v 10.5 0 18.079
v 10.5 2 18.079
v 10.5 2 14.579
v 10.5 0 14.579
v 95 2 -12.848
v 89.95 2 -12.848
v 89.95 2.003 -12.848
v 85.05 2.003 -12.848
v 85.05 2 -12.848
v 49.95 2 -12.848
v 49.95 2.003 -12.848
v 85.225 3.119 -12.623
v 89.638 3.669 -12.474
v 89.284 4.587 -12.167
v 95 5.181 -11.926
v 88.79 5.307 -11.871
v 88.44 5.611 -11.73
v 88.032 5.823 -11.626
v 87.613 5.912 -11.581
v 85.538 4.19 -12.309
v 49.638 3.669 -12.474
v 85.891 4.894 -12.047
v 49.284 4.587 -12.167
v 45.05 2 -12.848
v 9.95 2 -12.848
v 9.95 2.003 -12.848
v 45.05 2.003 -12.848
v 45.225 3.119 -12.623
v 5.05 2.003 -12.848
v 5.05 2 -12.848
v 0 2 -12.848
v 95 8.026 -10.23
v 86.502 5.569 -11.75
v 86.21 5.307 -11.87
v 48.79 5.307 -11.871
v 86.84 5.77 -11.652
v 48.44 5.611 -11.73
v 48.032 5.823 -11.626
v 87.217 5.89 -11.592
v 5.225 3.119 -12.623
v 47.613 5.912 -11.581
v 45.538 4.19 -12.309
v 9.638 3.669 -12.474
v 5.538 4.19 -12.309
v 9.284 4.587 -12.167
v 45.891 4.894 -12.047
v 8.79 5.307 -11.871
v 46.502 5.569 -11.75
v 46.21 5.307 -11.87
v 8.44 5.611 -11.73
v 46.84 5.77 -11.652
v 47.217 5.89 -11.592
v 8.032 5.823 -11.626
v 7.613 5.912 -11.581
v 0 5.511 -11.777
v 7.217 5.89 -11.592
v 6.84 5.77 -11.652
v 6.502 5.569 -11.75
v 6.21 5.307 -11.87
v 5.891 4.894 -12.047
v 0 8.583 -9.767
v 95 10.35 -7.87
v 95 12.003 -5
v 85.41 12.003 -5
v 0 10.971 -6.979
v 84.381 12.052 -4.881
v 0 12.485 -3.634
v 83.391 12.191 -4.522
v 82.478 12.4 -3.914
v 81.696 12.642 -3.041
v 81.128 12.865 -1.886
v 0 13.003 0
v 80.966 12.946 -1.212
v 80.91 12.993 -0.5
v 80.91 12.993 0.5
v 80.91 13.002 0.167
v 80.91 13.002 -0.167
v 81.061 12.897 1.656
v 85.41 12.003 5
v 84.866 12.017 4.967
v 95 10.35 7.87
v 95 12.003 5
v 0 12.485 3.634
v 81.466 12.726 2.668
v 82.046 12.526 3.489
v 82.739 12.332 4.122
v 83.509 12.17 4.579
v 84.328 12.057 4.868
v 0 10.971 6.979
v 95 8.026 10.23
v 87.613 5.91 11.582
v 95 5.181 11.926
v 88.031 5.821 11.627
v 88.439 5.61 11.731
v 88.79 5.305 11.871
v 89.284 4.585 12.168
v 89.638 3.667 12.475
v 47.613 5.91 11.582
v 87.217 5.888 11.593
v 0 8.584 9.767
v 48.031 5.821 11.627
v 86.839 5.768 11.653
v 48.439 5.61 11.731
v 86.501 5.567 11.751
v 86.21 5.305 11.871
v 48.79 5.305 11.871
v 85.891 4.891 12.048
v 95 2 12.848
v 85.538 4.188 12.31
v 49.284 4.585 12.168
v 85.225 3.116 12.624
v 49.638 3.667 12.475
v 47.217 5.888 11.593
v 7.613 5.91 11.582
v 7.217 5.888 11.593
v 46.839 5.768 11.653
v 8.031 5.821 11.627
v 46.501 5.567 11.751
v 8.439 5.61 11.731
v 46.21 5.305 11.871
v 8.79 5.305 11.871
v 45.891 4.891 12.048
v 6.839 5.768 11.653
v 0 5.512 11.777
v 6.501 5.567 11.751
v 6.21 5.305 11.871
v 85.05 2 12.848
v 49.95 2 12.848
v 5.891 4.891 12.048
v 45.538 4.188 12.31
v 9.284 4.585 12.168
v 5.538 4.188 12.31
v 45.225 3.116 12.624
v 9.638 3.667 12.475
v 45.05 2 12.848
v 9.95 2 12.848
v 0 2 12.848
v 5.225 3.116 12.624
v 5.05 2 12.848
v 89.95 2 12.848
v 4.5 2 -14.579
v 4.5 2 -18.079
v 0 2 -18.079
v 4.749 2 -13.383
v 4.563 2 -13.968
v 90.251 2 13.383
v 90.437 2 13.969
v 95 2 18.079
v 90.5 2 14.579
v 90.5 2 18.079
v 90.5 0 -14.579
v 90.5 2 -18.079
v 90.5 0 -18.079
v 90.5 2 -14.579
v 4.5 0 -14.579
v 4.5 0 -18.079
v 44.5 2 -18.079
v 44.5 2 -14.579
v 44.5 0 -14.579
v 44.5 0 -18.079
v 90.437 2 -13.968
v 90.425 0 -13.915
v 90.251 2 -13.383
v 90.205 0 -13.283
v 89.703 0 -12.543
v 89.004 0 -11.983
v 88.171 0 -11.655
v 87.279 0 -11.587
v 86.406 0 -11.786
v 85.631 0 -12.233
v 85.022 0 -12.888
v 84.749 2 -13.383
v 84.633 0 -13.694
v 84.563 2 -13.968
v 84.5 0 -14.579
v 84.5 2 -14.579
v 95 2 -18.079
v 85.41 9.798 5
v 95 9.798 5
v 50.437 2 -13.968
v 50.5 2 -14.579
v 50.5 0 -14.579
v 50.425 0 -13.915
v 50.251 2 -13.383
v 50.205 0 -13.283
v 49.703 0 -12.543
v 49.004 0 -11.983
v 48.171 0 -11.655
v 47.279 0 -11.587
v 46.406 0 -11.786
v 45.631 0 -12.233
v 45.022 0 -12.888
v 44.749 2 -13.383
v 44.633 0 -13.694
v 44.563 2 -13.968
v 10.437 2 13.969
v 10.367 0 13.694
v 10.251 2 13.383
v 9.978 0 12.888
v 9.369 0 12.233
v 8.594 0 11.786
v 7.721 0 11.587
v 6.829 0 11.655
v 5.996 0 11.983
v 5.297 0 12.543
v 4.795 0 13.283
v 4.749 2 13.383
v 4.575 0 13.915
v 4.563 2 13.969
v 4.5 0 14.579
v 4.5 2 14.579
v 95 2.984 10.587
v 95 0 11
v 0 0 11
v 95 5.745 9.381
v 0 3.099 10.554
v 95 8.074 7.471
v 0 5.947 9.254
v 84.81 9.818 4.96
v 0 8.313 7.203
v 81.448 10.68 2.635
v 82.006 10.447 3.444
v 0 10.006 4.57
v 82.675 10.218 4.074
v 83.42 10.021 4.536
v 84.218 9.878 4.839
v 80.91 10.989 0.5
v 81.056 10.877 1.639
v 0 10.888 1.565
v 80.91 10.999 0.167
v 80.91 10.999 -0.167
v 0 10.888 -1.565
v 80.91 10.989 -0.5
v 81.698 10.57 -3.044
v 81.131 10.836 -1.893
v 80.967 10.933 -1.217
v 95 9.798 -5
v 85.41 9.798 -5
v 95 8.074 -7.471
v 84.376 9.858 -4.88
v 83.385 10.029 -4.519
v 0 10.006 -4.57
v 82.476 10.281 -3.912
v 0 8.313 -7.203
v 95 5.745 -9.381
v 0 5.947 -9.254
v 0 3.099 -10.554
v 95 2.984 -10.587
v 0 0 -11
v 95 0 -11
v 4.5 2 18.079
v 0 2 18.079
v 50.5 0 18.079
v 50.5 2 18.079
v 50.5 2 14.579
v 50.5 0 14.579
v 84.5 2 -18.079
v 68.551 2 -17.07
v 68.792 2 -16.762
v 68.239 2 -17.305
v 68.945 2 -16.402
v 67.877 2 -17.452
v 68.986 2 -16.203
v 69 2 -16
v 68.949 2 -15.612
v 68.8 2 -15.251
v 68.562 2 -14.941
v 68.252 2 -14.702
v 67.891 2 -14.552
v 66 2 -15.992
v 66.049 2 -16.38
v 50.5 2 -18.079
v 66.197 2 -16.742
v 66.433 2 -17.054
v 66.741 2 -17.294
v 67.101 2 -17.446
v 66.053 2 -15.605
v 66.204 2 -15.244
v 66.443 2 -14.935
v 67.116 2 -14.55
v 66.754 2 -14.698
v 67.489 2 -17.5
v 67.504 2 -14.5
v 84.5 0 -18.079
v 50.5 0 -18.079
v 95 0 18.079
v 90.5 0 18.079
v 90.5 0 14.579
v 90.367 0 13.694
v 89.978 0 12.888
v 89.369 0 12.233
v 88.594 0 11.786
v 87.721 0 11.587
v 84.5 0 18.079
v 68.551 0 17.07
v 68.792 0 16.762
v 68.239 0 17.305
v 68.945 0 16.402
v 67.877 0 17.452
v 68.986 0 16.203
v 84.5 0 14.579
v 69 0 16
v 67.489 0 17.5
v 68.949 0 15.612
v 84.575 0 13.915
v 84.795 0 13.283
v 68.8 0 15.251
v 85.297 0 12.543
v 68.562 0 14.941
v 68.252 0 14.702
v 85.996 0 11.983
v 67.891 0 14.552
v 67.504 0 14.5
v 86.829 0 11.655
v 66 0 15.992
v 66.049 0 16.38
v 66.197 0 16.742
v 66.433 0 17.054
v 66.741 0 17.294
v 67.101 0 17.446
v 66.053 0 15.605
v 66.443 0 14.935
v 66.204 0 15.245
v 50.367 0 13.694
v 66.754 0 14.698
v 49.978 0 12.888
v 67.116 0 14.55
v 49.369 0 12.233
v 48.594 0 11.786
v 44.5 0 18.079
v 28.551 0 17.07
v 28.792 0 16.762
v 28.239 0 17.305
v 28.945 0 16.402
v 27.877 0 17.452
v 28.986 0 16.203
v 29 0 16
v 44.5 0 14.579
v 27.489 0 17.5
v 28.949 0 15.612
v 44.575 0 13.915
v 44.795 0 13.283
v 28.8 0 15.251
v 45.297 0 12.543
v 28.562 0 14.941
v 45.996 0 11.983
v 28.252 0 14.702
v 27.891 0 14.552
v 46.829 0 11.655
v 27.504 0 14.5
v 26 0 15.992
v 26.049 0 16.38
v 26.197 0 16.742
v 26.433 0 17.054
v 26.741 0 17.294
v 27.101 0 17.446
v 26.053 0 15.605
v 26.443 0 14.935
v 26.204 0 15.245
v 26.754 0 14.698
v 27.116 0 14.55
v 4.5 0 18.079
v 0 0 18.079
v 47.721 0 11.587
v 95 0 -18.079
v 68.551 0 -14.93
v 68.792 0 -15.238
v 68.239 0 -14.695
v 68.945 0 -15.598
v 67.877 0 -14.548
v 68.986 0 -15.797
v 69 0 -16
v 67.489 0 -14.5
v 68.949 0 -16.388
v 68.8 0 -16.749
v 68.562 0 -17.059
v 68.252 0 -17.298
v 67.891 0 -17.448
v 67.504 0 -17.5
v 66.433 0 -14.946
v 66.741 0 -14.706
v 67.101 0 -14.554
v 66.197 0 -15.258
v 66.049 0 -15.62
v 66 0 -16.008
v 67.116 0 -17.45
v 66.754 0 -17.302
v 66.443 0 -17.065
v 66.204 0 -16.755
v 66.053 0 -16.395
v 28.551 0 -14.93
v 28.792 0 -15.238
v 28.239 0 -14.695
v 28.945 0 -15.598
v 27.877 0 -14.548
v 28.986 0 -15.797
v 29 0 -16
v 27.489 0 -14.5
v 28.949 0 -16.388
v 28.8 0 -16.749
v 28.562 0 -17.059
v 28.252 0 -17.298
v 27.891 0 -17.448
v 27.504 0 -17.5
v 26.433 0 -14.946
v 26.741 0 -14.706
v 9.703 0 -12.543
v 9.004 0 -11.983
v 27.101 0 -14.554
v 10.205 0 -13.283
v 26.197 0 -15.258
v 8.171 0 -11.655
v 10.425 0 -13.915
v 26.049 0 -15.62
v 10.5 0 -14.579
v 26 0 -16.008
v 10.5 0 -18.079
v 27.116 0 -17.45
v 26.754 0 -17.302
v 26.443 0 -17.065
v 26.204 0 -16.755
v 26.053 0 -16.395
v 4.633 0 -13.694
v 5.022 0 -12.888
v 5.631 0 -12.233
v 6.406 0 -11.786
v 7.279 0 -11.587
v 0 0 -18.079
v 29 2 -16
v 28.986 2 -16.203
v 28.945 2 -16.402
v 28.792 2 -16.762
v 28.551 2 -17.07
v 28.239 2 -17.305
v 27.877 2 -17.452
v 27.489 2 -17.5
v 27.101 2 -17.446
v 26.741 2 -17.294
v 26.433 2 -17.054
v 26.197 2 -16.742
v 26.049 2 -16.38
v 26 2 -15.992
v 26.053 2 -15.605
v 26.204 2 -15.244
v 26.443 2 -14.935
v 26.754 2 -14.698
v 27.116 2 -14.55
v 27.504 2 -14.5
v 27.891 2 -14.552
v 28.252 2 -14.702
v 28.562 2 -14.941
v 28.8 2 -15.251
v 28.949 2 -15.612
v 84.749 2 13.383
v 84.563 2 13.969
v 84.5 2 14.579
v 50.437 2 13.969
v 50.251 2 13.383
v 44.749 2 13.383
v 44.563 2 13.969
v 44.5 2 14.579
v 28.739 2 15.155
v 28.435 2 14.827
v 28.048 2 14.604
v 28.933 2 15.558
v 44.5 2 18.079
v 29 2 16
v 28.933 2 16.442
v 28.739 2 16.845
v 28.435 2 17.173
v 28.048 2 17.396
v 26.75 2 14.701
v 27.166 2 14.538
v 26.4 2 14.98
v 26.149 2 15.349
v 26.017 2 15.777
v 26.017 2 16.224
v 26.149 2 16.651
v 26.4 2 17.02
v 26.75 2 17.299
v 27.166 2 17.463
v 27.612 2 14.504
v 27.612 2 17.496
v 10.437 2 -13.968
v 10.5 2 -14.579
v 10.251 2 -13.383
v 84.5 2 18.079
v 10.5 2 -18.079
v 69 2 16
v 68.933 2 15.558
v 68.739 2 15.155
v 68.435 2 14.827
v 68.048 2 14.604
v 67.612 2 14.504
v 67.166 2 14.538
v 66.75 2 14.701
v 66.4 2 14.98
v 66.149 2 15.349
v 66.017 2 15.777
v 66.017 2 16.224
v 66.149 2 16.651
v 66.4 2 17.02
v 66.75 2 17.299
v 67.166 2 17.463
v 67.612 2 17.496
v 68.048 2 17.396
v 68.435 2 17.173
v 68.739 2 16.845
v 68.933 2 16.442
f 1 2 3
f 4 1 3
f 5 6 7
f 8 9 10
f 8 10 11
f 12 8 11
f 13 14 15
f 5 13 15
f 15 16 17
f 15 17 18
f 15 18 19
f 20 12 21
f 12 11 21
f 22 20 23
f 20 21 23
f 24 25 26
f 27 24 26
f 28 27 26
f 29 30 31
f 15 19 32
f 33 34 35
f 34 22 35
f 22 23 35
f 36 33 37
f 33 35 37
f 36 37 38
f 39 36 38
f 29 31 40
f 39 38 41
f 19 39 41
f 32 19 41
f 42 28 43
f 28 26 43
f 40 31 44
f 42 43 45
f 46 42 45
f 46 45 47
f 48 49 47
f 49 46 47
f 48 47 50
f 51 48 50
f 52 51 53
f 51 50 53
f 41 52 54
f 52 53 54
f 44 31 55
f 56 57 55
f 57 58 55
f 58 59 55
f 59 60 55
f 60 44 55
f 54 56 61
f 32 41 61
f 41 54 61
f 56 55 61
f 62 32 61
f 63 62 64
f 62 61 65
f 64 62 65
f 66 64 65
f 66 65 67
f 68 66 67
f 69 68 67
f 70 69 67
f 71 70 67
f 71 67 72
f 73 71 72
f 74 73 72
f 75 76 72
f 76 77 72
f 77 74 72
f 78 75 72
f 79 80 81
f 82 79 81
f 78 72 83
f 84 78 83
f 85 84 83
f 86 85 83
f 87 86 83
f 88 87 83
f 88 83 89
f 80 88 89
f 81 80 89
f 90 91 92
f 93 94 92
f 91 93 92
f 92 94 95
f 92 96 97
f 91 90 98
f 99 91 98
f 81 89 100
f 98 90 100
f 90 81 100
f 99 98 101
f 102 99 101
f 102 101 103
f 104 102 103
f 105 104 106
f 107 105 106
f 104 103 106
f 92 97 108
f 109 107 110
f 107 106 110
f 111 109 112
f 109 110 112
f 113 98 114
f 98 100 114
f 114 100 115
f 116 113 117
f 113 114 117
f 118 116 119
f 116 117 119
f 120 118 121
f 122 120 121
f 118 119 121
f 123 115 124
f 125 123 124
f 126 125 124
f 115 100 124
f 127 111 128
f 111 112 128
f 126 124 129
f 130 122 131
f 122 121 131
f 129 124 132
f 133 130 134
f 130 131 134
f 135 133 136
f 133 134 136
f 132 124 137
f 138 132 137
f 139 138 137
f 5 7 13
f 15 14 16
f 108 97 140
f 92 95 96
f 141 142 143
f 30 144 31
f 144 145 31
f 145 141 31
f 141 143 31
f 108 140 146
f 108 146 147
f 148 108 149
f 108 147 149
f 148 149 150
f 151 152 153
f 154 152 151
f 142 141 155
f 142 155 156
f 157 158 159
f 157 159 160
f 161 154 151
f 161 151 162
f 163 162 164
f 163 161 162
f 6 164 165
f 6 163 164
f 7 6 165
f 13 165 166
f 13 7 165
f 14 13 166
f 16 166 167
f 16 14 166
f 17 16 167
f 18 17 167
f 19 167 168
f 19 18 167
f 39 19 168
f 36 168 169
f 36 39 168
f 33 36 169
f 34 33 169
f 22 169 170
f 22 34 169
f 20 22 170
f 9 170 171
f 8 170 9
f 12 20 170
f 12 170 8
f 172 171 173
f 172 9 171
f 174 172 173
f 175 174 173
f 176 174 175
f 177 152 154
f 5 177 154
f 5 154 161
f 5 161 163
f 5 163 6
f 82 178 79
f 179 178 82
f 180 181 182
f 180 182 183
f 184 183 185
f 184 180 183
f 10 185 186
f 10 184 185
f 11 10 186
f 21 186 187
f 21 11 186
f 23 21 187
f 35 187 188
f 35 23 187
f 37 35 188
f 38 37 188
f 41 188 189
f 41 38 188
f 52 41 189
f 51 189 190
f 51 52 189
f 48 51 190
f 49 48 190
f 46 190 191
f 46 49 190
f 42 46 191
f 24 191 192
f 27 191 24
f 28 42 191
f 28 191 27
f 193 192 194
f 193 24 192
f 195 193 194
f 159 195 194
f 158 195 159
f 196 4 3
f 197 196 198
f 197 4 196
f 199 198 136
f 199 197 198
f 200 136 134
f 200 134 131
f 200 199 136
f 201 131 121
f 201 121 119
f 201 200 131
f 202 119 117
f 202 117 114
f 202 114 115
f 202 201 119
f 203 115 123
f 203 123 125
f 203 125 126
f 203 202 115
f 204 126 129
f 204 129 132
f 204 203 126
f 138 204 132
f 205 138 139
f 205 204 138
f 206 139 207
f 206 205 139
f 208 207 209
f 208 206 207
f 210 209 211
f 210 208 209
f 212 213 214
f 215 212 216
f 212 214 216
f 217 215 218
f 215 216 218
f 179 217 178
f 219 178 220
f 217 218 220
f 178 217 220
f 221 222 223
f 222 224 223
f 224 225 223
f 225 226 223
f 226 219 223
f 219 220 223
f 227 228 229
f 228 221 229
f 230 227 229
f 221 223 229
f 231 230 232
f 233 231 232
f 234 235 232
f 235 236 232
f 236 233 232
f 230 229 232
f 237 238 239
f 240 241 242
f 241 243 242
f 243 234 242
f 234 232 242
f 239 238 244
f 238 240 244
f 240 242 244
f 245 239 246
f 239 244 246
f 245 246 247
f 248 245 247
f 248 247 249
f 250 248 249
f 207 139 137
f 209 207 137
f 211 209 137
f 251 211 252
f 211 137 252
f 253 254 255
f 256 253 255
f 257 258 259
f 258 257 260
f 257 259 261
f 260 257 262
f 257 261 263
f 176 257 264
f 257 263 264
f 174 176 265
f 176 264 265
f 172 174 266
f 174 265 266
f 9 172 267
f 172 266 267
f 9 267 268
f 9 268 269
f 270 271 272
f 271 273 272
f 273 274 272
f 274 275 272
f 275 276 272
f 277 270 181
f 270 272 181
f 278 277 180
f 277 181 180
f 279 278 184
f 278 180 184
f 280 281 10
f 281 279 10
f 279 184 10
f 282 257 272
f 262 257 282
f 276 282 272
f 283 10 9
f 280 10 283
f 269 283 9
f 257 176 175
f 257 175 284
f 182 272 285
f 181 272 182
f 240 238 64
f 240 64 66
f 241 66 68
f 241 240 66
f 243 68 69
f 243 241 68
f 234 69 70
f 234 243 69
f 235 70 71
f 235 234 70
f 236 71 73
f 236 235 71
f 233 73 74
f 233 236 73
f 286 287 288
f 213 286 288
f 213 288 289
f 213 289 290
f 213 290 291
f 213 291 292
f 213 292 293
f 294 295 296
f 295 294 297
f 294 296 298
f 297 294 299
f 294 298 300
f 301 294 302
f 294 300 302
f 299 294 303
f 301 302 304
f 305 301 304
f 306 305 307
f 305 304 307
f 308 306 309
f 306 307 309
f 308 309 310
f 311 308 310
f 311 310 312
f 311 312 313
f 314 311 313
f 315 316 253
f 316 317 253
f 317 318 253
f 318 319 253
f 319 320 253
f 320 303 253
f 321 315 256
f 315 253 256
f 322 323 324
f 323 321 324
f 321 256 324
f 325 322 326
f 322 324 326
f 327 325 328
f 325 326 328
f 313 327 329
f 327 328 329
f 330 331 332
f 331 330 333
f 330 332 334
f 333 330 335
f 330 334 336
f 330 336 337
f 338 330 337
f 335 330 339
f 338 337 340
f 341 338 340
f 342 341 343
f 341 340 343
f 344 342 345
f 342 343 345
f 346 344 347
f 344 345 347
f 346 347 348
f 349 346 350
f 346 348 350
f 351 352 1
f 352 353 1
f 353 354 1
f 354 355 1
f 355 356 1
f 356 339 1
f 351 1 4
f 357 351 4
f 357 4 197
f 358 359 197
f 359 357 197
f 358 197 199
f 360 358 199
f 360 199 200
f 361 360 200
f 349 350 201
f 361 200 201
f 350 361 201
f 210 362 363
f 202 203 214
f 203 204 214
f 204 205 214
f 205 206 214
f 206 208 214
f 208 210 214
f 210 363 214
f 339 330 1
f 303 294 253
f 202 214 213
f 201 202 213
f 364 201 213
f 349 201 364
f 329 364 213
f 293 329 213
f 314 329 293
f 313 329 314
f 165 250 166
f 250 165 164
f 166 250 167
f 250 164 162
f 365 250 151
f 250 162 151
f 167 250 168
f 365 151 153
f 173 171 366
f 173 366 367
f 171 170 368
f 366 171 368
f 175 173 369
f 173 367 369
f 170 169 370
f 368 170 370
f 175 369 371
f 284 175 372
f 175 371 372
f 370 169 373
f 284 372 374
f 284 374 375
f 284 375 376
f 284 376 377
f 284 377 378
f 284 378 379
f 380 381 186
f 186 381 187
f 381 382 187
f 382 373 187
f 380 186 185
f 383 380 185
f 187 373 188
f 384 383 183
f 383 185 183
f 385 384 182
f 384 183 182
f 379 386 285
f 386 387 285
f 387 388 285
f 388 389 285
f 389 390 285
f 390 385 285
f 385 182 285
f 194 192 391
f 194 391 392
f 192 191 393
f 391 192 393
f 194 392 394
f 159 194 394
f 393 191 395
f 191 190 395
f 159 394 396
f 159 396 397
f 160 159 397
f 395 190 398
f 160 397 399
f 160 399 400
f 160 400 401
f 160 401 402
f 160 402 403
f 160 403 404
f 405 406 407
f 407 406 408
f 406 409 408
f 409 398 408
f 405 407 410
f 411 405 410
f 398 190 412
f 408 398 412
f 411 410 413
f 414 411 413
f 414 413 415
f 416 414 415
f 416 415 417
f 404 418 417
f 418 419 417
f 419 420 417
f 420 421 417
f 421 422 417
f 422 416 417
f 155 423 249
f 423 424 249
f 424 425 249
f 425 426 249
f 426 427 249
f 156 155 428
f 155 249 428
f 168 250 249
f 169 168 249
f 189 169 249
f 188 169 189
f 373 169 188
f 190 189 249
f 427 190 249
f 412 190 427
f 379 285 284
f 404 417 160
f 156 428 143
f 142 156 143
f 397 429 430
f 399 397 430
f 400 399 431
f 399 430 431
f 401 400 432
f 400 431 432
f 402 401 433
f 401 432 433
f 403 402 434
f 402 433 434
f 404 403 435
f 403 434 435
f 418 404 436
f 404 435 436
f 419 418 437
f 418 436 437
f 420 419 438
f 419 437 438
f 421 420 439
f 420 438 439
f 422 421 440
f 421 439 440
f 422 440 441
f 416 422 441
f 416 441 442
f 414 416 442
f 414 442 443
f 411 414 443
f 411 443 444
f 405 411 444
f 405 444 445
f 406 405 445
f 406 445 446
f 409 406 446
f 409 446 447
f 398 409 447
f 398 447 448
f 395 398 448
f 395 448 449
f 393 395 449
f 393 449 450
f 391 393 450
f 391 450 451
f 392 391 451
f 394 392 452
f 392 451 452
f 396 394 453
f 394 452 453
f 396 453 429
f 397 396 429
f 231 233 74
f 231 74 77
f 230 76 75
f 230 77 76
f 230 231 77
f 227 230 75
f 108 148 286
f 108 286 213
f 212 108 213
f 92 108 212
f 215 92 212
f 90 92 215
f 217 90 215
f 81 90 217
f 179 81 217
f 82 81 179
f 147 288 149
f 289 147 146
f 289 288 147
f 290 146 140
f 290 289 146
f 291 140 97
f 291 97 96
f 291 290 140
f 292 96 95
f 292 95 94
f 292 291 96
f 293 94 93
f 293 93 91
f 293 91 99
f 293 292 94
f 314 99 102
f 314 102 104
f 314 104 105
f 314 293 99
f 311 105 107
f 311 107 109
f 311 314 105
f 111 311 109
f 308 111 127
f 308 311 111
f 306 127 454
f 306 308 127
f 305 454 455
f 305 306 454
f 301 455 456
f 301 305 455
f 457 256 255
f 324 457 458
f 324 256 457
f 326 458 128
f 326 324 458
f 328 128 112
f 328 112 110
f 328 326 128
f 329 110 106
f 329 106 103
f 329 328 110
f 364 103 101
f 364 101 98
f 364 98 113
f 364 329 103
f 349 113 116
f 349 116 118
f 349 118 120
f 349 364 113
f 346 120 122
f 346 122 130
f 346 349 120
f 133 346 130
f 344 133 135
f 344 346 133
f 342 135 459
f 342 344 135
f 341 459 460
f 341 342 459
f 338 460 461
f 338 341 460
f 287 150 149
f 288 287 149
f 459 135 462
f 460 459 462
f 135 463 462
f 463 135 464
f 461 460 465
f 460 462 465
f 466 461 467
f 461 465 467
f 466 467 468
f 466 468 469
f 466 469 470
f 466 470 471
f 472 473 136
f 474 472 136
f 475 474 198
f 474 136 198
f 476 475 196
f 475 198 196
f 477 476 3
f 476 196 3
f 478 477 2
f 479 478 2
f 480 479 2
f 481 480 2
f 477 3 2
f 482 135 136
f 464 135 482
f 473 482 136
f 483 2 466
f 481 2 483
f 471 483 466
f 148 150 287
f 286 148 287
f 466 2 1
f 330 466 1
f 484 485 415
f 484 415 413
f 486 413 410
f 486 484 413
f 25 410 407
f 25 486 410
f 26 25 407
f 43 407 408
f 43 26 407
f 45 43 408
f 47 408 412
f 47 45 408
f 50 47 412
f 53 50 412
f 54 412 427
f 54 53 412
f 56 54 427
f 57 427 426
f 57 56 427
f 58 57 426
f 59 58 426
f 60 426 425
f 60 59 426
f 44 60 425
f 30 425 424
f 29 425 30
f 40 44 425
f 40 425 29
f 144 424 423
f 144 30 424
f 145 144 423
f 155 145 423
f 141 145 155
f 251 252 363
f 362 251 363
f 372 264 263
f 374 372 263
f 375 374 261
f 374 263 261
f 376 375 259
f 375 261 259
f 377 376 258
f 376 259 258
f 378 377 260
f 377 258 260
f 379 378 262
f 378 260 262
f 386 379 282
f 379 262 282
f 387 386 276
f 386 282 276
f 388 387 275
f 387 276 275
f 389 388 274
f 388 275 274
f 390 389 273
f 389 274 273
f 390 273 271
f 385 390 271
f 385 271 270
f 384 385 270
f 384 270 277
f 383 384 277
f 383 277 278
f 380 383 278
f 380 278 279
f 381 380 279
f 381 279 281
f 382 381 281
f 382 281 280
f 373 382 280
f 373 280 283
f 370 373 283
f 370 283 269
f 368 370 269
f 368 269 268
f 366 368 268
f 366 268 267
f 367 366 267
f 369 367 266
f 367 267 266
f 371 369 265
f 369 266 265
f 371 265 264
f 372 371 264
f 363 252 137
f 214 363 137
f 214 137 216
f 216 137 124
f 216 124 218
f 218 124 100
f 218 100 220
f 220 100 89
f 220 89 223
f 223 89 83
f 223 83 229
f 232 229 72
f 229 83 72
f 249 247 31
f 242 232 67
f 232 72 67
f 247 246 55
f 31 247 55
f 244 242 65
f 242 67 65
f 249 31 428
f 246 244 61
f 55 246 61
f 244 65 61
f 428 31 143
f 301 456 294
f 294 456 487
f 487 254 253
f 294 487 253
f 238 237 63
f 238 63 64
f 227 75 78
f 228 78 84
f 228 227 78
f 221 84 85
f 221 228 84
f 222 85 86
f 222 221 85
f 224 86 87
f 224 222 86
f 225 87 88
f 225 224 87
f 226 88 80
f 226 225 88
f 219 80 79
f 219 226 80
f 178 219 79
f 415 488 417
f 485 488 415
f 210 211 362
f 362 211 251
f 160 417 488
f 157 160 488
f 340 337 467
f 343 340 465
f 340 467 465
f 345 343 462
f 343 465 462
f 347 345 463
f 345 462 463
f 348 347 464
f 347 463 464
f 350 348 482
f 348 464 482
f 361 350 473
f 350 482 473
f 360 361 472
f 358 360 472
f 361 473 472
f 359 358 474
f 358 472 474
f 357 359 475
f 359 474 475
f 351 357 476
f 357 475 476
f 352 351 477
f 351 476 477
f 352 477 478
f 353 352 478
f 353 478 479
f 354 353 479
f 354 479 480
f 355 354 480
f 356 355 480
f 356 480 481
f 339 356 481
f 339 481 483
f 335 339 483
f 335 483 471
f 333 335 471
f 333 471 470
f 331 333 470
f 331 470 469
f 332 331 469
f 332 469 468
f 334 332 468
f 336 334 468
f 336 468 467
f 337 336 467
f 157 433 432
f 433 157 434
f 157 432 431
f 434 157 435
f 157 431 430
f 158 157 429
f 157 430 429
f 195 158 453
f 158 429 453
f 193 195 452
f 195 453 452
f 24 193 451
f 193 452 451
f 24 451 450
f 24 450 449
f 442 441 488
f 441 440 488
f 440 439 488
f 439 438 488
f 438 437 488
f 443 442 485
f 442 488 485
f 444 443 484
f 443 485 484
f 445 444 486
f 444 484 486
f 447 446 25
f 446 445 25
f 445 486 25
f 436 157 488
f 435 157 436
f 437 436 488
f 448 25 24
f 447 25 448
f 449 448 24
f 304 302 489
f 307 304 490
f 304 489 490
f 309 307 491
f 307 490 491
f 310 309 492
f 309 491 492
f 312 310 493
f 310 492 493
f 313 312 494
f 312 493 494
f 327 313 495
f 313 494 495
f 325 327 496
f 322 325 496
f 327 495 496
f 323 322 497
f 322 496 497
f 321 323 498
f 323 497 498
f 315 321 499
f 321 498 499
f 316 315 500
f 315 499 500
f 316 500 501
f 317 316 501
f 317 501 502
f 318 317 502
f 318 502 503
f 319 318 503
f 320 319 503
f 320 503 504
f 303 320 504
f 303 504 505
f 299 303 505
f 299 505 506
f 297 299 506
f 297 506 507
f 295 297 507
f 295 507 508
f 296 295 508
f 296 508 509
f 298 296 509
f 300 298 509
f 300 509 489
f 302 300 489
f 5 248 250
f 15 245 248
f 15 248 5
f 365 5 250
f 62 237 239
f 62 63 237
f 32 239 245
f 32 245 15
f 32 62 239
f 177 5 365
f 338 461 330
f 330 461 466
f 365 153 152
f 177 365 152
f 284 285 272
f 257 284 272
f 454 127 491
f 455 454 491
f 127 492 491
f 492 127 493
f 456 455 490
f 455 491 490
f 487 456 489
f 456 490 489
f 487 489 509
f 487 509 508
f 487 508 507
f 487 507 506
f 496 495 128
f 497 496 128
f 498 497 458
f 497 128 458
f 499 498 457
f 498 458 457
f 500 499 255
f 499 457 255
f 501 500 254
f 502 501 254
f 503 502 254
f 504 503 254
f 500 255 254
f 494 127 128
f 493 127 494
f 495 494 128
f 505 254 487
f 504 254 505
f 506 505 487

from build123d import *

# Parameters (mm, degrees)
EXTRUDE_1_DEPTH          = 95
SKETCH_2_R               = 1.5
CUT_EXTRUDE_1_DEPTH      = 12.002837415
CUT_EXTRUDE_1_DEPTH_BACK = 3.00301723
CUT_EXTRUDE_2_DEPTH      = 14.002837554


with BuildPart() as part:
    # Эскиз1 → Бобышка-Вытянуть1 (new body)
    with BuildSketch(Plane(origin=(0, 0, 0), x_dir=(0, 0, -1), z_dir=(1, 0, 0))):
        with BuildLine():
            Line((11, 0), (18.079487192, 0))
            Line((18.079487192, 0), (18.079487192, 2))
            Line((18.079487192, 2), (12.848104212, 2))
            ThreePointArc((12.848104212, 2), (0.000220895, 13.002837452), (-12.848036252, 2.000436531))
            Line((-12.848036252, 2.000436531), (-18.079487192, 2))
            Line((-18.079487192, 2), (-18.079487192, 0))
            Line((-18.079487192, 0), (-11, 0))
            ThreePointArc((-11, 0), (0, 11), (11, 0))
        make_face()
    extrude(amount=EXTRUDE_1_DEPTH)

    # Эскиз2 → Вырез-Вытянуть1 (cut, two sides)
    with BuildSketch(Plane(origin=(0, 2.001508604, 0.000167013), x_dir=(1, 0, 0), z_dir=(0, 0.999999997, 8.3444e-05))) as cut_extrude_1_sk:
        with Locations((27.5, -16)):
            Circle(SKETCH_2_R)
        with Locations((67.5, -16)):
            Circle(SKETCH_2_R)
        with Locations((67.5, 16)):
            Circle(SKETCH_2_R)
        with Locations((27.5, 16)):
            Circle(SKETCH_2_R)
        with BuildLine():
            Line((4.5, -14.579320241), (4.5, -18.29882224))
            Line((4.5, -18.29882224), (10.5, -18.29882224))
            Line((10.5, -18.29882224), (10.5, -14.579320241))
            ThreePointArc((10.5, -14.579320241), (7.5, -11.579320241), (4.5, -14.579320241))
        make_face()
        with BuildLine():
            Line((50.5, -18.29882224), (50.5, -14.579320241))
            ThreePointArc((50.5, -14.579320241), (47.5, -11.579320241), (44.5, -14.579320241))
            Line((44.5, -14.579320241), (44.5, -18.29882224))
            Line((44.5, -18.29882224), (50.5, -18.29882224))
        make_face()
        with BuildLine():
            Line((90.5, -18.29882224), (90.5, -14.579320241))
            ThreePointArc((90.5, -14.579320241), (87.5, -11.579320241), (84.5, -14.579320241))
            Line((84.5, -14.579320241), (84.5, -18.29882224))
            Line((84.5, -18.29882224), (90.5, -18.29882224))
        make_face()
        with BuildLine():
            Line((84.5, 18.29882224), (90.5, 18.29882224))
            Line((90.5, 18.29882224), (90.5, 14.579320241))
            ThreePointArc((90.5, 14.579320241), (87.5, 11.579320241), (84.5, 14.579320241))
            Line((84.5, 14.579320241), (84.5, 18.29882224))
        make_face()
        with BuildLine():
            Line((44.5, 18.29882224), (50.5, 18.29882224))
            Line((50.5, 18.29882224), (50.5, 14.579320241))
            ThreePointArc((50.5, 14.579320241), (47.5, 11.579320241), (44.5, 14.579320241))
            Line((44.5, 14.579320241), (44.5, 18.29882224))
        make_face()
        with BuildLine():
            Line((4.5, 18.29882224), (10.5, 18.29882224))
            Line((10.5, 18.29882224), (10.5, 14.579320241))
            ThreePointArc((10.5, 14.579320241), (7.5, 11.579320241), (4.5, 14.579320241))
            Line((4.5, 14.579320241), (4.5, 18.29882224))
        make_face()
    extrude(amount=CUT_EXTRUDE_1_DEPTH, mode=Mode.SUBTRACT)
    extrude(cut_extrude_1_sk.sketch, amount=-CUT_EXTRUDE_1_DEPTH_BACK, mode=Mode.SUBTRACT)

    # Эскиз3 → Вырез-Вытянуть2 (cut, through all)
    with BuildSketch(Plane.XZ):
        with BuildLine():
            Line((85.409616901, 5), (95, 5))
            Line((95, 5), (95, -5))
            Line((95, -5), (85.409616901, -5))
            ThreePointArc((85.409616901, -5), (82.227636386, -3.681980515), (80.909616901, -0.5))
            Line((80.909616901, -0.5), (80.909616901, 0.5))
            ThreePointArc((80.909616901, 0.5), (82.227636386, 3.681980515), (85.409616901, 5))
        make_face()
    extrude(amount=-CUT_EXTRUDE_2_DEPTH, mode=Mode.SUBTRACT)


solid = part.part
